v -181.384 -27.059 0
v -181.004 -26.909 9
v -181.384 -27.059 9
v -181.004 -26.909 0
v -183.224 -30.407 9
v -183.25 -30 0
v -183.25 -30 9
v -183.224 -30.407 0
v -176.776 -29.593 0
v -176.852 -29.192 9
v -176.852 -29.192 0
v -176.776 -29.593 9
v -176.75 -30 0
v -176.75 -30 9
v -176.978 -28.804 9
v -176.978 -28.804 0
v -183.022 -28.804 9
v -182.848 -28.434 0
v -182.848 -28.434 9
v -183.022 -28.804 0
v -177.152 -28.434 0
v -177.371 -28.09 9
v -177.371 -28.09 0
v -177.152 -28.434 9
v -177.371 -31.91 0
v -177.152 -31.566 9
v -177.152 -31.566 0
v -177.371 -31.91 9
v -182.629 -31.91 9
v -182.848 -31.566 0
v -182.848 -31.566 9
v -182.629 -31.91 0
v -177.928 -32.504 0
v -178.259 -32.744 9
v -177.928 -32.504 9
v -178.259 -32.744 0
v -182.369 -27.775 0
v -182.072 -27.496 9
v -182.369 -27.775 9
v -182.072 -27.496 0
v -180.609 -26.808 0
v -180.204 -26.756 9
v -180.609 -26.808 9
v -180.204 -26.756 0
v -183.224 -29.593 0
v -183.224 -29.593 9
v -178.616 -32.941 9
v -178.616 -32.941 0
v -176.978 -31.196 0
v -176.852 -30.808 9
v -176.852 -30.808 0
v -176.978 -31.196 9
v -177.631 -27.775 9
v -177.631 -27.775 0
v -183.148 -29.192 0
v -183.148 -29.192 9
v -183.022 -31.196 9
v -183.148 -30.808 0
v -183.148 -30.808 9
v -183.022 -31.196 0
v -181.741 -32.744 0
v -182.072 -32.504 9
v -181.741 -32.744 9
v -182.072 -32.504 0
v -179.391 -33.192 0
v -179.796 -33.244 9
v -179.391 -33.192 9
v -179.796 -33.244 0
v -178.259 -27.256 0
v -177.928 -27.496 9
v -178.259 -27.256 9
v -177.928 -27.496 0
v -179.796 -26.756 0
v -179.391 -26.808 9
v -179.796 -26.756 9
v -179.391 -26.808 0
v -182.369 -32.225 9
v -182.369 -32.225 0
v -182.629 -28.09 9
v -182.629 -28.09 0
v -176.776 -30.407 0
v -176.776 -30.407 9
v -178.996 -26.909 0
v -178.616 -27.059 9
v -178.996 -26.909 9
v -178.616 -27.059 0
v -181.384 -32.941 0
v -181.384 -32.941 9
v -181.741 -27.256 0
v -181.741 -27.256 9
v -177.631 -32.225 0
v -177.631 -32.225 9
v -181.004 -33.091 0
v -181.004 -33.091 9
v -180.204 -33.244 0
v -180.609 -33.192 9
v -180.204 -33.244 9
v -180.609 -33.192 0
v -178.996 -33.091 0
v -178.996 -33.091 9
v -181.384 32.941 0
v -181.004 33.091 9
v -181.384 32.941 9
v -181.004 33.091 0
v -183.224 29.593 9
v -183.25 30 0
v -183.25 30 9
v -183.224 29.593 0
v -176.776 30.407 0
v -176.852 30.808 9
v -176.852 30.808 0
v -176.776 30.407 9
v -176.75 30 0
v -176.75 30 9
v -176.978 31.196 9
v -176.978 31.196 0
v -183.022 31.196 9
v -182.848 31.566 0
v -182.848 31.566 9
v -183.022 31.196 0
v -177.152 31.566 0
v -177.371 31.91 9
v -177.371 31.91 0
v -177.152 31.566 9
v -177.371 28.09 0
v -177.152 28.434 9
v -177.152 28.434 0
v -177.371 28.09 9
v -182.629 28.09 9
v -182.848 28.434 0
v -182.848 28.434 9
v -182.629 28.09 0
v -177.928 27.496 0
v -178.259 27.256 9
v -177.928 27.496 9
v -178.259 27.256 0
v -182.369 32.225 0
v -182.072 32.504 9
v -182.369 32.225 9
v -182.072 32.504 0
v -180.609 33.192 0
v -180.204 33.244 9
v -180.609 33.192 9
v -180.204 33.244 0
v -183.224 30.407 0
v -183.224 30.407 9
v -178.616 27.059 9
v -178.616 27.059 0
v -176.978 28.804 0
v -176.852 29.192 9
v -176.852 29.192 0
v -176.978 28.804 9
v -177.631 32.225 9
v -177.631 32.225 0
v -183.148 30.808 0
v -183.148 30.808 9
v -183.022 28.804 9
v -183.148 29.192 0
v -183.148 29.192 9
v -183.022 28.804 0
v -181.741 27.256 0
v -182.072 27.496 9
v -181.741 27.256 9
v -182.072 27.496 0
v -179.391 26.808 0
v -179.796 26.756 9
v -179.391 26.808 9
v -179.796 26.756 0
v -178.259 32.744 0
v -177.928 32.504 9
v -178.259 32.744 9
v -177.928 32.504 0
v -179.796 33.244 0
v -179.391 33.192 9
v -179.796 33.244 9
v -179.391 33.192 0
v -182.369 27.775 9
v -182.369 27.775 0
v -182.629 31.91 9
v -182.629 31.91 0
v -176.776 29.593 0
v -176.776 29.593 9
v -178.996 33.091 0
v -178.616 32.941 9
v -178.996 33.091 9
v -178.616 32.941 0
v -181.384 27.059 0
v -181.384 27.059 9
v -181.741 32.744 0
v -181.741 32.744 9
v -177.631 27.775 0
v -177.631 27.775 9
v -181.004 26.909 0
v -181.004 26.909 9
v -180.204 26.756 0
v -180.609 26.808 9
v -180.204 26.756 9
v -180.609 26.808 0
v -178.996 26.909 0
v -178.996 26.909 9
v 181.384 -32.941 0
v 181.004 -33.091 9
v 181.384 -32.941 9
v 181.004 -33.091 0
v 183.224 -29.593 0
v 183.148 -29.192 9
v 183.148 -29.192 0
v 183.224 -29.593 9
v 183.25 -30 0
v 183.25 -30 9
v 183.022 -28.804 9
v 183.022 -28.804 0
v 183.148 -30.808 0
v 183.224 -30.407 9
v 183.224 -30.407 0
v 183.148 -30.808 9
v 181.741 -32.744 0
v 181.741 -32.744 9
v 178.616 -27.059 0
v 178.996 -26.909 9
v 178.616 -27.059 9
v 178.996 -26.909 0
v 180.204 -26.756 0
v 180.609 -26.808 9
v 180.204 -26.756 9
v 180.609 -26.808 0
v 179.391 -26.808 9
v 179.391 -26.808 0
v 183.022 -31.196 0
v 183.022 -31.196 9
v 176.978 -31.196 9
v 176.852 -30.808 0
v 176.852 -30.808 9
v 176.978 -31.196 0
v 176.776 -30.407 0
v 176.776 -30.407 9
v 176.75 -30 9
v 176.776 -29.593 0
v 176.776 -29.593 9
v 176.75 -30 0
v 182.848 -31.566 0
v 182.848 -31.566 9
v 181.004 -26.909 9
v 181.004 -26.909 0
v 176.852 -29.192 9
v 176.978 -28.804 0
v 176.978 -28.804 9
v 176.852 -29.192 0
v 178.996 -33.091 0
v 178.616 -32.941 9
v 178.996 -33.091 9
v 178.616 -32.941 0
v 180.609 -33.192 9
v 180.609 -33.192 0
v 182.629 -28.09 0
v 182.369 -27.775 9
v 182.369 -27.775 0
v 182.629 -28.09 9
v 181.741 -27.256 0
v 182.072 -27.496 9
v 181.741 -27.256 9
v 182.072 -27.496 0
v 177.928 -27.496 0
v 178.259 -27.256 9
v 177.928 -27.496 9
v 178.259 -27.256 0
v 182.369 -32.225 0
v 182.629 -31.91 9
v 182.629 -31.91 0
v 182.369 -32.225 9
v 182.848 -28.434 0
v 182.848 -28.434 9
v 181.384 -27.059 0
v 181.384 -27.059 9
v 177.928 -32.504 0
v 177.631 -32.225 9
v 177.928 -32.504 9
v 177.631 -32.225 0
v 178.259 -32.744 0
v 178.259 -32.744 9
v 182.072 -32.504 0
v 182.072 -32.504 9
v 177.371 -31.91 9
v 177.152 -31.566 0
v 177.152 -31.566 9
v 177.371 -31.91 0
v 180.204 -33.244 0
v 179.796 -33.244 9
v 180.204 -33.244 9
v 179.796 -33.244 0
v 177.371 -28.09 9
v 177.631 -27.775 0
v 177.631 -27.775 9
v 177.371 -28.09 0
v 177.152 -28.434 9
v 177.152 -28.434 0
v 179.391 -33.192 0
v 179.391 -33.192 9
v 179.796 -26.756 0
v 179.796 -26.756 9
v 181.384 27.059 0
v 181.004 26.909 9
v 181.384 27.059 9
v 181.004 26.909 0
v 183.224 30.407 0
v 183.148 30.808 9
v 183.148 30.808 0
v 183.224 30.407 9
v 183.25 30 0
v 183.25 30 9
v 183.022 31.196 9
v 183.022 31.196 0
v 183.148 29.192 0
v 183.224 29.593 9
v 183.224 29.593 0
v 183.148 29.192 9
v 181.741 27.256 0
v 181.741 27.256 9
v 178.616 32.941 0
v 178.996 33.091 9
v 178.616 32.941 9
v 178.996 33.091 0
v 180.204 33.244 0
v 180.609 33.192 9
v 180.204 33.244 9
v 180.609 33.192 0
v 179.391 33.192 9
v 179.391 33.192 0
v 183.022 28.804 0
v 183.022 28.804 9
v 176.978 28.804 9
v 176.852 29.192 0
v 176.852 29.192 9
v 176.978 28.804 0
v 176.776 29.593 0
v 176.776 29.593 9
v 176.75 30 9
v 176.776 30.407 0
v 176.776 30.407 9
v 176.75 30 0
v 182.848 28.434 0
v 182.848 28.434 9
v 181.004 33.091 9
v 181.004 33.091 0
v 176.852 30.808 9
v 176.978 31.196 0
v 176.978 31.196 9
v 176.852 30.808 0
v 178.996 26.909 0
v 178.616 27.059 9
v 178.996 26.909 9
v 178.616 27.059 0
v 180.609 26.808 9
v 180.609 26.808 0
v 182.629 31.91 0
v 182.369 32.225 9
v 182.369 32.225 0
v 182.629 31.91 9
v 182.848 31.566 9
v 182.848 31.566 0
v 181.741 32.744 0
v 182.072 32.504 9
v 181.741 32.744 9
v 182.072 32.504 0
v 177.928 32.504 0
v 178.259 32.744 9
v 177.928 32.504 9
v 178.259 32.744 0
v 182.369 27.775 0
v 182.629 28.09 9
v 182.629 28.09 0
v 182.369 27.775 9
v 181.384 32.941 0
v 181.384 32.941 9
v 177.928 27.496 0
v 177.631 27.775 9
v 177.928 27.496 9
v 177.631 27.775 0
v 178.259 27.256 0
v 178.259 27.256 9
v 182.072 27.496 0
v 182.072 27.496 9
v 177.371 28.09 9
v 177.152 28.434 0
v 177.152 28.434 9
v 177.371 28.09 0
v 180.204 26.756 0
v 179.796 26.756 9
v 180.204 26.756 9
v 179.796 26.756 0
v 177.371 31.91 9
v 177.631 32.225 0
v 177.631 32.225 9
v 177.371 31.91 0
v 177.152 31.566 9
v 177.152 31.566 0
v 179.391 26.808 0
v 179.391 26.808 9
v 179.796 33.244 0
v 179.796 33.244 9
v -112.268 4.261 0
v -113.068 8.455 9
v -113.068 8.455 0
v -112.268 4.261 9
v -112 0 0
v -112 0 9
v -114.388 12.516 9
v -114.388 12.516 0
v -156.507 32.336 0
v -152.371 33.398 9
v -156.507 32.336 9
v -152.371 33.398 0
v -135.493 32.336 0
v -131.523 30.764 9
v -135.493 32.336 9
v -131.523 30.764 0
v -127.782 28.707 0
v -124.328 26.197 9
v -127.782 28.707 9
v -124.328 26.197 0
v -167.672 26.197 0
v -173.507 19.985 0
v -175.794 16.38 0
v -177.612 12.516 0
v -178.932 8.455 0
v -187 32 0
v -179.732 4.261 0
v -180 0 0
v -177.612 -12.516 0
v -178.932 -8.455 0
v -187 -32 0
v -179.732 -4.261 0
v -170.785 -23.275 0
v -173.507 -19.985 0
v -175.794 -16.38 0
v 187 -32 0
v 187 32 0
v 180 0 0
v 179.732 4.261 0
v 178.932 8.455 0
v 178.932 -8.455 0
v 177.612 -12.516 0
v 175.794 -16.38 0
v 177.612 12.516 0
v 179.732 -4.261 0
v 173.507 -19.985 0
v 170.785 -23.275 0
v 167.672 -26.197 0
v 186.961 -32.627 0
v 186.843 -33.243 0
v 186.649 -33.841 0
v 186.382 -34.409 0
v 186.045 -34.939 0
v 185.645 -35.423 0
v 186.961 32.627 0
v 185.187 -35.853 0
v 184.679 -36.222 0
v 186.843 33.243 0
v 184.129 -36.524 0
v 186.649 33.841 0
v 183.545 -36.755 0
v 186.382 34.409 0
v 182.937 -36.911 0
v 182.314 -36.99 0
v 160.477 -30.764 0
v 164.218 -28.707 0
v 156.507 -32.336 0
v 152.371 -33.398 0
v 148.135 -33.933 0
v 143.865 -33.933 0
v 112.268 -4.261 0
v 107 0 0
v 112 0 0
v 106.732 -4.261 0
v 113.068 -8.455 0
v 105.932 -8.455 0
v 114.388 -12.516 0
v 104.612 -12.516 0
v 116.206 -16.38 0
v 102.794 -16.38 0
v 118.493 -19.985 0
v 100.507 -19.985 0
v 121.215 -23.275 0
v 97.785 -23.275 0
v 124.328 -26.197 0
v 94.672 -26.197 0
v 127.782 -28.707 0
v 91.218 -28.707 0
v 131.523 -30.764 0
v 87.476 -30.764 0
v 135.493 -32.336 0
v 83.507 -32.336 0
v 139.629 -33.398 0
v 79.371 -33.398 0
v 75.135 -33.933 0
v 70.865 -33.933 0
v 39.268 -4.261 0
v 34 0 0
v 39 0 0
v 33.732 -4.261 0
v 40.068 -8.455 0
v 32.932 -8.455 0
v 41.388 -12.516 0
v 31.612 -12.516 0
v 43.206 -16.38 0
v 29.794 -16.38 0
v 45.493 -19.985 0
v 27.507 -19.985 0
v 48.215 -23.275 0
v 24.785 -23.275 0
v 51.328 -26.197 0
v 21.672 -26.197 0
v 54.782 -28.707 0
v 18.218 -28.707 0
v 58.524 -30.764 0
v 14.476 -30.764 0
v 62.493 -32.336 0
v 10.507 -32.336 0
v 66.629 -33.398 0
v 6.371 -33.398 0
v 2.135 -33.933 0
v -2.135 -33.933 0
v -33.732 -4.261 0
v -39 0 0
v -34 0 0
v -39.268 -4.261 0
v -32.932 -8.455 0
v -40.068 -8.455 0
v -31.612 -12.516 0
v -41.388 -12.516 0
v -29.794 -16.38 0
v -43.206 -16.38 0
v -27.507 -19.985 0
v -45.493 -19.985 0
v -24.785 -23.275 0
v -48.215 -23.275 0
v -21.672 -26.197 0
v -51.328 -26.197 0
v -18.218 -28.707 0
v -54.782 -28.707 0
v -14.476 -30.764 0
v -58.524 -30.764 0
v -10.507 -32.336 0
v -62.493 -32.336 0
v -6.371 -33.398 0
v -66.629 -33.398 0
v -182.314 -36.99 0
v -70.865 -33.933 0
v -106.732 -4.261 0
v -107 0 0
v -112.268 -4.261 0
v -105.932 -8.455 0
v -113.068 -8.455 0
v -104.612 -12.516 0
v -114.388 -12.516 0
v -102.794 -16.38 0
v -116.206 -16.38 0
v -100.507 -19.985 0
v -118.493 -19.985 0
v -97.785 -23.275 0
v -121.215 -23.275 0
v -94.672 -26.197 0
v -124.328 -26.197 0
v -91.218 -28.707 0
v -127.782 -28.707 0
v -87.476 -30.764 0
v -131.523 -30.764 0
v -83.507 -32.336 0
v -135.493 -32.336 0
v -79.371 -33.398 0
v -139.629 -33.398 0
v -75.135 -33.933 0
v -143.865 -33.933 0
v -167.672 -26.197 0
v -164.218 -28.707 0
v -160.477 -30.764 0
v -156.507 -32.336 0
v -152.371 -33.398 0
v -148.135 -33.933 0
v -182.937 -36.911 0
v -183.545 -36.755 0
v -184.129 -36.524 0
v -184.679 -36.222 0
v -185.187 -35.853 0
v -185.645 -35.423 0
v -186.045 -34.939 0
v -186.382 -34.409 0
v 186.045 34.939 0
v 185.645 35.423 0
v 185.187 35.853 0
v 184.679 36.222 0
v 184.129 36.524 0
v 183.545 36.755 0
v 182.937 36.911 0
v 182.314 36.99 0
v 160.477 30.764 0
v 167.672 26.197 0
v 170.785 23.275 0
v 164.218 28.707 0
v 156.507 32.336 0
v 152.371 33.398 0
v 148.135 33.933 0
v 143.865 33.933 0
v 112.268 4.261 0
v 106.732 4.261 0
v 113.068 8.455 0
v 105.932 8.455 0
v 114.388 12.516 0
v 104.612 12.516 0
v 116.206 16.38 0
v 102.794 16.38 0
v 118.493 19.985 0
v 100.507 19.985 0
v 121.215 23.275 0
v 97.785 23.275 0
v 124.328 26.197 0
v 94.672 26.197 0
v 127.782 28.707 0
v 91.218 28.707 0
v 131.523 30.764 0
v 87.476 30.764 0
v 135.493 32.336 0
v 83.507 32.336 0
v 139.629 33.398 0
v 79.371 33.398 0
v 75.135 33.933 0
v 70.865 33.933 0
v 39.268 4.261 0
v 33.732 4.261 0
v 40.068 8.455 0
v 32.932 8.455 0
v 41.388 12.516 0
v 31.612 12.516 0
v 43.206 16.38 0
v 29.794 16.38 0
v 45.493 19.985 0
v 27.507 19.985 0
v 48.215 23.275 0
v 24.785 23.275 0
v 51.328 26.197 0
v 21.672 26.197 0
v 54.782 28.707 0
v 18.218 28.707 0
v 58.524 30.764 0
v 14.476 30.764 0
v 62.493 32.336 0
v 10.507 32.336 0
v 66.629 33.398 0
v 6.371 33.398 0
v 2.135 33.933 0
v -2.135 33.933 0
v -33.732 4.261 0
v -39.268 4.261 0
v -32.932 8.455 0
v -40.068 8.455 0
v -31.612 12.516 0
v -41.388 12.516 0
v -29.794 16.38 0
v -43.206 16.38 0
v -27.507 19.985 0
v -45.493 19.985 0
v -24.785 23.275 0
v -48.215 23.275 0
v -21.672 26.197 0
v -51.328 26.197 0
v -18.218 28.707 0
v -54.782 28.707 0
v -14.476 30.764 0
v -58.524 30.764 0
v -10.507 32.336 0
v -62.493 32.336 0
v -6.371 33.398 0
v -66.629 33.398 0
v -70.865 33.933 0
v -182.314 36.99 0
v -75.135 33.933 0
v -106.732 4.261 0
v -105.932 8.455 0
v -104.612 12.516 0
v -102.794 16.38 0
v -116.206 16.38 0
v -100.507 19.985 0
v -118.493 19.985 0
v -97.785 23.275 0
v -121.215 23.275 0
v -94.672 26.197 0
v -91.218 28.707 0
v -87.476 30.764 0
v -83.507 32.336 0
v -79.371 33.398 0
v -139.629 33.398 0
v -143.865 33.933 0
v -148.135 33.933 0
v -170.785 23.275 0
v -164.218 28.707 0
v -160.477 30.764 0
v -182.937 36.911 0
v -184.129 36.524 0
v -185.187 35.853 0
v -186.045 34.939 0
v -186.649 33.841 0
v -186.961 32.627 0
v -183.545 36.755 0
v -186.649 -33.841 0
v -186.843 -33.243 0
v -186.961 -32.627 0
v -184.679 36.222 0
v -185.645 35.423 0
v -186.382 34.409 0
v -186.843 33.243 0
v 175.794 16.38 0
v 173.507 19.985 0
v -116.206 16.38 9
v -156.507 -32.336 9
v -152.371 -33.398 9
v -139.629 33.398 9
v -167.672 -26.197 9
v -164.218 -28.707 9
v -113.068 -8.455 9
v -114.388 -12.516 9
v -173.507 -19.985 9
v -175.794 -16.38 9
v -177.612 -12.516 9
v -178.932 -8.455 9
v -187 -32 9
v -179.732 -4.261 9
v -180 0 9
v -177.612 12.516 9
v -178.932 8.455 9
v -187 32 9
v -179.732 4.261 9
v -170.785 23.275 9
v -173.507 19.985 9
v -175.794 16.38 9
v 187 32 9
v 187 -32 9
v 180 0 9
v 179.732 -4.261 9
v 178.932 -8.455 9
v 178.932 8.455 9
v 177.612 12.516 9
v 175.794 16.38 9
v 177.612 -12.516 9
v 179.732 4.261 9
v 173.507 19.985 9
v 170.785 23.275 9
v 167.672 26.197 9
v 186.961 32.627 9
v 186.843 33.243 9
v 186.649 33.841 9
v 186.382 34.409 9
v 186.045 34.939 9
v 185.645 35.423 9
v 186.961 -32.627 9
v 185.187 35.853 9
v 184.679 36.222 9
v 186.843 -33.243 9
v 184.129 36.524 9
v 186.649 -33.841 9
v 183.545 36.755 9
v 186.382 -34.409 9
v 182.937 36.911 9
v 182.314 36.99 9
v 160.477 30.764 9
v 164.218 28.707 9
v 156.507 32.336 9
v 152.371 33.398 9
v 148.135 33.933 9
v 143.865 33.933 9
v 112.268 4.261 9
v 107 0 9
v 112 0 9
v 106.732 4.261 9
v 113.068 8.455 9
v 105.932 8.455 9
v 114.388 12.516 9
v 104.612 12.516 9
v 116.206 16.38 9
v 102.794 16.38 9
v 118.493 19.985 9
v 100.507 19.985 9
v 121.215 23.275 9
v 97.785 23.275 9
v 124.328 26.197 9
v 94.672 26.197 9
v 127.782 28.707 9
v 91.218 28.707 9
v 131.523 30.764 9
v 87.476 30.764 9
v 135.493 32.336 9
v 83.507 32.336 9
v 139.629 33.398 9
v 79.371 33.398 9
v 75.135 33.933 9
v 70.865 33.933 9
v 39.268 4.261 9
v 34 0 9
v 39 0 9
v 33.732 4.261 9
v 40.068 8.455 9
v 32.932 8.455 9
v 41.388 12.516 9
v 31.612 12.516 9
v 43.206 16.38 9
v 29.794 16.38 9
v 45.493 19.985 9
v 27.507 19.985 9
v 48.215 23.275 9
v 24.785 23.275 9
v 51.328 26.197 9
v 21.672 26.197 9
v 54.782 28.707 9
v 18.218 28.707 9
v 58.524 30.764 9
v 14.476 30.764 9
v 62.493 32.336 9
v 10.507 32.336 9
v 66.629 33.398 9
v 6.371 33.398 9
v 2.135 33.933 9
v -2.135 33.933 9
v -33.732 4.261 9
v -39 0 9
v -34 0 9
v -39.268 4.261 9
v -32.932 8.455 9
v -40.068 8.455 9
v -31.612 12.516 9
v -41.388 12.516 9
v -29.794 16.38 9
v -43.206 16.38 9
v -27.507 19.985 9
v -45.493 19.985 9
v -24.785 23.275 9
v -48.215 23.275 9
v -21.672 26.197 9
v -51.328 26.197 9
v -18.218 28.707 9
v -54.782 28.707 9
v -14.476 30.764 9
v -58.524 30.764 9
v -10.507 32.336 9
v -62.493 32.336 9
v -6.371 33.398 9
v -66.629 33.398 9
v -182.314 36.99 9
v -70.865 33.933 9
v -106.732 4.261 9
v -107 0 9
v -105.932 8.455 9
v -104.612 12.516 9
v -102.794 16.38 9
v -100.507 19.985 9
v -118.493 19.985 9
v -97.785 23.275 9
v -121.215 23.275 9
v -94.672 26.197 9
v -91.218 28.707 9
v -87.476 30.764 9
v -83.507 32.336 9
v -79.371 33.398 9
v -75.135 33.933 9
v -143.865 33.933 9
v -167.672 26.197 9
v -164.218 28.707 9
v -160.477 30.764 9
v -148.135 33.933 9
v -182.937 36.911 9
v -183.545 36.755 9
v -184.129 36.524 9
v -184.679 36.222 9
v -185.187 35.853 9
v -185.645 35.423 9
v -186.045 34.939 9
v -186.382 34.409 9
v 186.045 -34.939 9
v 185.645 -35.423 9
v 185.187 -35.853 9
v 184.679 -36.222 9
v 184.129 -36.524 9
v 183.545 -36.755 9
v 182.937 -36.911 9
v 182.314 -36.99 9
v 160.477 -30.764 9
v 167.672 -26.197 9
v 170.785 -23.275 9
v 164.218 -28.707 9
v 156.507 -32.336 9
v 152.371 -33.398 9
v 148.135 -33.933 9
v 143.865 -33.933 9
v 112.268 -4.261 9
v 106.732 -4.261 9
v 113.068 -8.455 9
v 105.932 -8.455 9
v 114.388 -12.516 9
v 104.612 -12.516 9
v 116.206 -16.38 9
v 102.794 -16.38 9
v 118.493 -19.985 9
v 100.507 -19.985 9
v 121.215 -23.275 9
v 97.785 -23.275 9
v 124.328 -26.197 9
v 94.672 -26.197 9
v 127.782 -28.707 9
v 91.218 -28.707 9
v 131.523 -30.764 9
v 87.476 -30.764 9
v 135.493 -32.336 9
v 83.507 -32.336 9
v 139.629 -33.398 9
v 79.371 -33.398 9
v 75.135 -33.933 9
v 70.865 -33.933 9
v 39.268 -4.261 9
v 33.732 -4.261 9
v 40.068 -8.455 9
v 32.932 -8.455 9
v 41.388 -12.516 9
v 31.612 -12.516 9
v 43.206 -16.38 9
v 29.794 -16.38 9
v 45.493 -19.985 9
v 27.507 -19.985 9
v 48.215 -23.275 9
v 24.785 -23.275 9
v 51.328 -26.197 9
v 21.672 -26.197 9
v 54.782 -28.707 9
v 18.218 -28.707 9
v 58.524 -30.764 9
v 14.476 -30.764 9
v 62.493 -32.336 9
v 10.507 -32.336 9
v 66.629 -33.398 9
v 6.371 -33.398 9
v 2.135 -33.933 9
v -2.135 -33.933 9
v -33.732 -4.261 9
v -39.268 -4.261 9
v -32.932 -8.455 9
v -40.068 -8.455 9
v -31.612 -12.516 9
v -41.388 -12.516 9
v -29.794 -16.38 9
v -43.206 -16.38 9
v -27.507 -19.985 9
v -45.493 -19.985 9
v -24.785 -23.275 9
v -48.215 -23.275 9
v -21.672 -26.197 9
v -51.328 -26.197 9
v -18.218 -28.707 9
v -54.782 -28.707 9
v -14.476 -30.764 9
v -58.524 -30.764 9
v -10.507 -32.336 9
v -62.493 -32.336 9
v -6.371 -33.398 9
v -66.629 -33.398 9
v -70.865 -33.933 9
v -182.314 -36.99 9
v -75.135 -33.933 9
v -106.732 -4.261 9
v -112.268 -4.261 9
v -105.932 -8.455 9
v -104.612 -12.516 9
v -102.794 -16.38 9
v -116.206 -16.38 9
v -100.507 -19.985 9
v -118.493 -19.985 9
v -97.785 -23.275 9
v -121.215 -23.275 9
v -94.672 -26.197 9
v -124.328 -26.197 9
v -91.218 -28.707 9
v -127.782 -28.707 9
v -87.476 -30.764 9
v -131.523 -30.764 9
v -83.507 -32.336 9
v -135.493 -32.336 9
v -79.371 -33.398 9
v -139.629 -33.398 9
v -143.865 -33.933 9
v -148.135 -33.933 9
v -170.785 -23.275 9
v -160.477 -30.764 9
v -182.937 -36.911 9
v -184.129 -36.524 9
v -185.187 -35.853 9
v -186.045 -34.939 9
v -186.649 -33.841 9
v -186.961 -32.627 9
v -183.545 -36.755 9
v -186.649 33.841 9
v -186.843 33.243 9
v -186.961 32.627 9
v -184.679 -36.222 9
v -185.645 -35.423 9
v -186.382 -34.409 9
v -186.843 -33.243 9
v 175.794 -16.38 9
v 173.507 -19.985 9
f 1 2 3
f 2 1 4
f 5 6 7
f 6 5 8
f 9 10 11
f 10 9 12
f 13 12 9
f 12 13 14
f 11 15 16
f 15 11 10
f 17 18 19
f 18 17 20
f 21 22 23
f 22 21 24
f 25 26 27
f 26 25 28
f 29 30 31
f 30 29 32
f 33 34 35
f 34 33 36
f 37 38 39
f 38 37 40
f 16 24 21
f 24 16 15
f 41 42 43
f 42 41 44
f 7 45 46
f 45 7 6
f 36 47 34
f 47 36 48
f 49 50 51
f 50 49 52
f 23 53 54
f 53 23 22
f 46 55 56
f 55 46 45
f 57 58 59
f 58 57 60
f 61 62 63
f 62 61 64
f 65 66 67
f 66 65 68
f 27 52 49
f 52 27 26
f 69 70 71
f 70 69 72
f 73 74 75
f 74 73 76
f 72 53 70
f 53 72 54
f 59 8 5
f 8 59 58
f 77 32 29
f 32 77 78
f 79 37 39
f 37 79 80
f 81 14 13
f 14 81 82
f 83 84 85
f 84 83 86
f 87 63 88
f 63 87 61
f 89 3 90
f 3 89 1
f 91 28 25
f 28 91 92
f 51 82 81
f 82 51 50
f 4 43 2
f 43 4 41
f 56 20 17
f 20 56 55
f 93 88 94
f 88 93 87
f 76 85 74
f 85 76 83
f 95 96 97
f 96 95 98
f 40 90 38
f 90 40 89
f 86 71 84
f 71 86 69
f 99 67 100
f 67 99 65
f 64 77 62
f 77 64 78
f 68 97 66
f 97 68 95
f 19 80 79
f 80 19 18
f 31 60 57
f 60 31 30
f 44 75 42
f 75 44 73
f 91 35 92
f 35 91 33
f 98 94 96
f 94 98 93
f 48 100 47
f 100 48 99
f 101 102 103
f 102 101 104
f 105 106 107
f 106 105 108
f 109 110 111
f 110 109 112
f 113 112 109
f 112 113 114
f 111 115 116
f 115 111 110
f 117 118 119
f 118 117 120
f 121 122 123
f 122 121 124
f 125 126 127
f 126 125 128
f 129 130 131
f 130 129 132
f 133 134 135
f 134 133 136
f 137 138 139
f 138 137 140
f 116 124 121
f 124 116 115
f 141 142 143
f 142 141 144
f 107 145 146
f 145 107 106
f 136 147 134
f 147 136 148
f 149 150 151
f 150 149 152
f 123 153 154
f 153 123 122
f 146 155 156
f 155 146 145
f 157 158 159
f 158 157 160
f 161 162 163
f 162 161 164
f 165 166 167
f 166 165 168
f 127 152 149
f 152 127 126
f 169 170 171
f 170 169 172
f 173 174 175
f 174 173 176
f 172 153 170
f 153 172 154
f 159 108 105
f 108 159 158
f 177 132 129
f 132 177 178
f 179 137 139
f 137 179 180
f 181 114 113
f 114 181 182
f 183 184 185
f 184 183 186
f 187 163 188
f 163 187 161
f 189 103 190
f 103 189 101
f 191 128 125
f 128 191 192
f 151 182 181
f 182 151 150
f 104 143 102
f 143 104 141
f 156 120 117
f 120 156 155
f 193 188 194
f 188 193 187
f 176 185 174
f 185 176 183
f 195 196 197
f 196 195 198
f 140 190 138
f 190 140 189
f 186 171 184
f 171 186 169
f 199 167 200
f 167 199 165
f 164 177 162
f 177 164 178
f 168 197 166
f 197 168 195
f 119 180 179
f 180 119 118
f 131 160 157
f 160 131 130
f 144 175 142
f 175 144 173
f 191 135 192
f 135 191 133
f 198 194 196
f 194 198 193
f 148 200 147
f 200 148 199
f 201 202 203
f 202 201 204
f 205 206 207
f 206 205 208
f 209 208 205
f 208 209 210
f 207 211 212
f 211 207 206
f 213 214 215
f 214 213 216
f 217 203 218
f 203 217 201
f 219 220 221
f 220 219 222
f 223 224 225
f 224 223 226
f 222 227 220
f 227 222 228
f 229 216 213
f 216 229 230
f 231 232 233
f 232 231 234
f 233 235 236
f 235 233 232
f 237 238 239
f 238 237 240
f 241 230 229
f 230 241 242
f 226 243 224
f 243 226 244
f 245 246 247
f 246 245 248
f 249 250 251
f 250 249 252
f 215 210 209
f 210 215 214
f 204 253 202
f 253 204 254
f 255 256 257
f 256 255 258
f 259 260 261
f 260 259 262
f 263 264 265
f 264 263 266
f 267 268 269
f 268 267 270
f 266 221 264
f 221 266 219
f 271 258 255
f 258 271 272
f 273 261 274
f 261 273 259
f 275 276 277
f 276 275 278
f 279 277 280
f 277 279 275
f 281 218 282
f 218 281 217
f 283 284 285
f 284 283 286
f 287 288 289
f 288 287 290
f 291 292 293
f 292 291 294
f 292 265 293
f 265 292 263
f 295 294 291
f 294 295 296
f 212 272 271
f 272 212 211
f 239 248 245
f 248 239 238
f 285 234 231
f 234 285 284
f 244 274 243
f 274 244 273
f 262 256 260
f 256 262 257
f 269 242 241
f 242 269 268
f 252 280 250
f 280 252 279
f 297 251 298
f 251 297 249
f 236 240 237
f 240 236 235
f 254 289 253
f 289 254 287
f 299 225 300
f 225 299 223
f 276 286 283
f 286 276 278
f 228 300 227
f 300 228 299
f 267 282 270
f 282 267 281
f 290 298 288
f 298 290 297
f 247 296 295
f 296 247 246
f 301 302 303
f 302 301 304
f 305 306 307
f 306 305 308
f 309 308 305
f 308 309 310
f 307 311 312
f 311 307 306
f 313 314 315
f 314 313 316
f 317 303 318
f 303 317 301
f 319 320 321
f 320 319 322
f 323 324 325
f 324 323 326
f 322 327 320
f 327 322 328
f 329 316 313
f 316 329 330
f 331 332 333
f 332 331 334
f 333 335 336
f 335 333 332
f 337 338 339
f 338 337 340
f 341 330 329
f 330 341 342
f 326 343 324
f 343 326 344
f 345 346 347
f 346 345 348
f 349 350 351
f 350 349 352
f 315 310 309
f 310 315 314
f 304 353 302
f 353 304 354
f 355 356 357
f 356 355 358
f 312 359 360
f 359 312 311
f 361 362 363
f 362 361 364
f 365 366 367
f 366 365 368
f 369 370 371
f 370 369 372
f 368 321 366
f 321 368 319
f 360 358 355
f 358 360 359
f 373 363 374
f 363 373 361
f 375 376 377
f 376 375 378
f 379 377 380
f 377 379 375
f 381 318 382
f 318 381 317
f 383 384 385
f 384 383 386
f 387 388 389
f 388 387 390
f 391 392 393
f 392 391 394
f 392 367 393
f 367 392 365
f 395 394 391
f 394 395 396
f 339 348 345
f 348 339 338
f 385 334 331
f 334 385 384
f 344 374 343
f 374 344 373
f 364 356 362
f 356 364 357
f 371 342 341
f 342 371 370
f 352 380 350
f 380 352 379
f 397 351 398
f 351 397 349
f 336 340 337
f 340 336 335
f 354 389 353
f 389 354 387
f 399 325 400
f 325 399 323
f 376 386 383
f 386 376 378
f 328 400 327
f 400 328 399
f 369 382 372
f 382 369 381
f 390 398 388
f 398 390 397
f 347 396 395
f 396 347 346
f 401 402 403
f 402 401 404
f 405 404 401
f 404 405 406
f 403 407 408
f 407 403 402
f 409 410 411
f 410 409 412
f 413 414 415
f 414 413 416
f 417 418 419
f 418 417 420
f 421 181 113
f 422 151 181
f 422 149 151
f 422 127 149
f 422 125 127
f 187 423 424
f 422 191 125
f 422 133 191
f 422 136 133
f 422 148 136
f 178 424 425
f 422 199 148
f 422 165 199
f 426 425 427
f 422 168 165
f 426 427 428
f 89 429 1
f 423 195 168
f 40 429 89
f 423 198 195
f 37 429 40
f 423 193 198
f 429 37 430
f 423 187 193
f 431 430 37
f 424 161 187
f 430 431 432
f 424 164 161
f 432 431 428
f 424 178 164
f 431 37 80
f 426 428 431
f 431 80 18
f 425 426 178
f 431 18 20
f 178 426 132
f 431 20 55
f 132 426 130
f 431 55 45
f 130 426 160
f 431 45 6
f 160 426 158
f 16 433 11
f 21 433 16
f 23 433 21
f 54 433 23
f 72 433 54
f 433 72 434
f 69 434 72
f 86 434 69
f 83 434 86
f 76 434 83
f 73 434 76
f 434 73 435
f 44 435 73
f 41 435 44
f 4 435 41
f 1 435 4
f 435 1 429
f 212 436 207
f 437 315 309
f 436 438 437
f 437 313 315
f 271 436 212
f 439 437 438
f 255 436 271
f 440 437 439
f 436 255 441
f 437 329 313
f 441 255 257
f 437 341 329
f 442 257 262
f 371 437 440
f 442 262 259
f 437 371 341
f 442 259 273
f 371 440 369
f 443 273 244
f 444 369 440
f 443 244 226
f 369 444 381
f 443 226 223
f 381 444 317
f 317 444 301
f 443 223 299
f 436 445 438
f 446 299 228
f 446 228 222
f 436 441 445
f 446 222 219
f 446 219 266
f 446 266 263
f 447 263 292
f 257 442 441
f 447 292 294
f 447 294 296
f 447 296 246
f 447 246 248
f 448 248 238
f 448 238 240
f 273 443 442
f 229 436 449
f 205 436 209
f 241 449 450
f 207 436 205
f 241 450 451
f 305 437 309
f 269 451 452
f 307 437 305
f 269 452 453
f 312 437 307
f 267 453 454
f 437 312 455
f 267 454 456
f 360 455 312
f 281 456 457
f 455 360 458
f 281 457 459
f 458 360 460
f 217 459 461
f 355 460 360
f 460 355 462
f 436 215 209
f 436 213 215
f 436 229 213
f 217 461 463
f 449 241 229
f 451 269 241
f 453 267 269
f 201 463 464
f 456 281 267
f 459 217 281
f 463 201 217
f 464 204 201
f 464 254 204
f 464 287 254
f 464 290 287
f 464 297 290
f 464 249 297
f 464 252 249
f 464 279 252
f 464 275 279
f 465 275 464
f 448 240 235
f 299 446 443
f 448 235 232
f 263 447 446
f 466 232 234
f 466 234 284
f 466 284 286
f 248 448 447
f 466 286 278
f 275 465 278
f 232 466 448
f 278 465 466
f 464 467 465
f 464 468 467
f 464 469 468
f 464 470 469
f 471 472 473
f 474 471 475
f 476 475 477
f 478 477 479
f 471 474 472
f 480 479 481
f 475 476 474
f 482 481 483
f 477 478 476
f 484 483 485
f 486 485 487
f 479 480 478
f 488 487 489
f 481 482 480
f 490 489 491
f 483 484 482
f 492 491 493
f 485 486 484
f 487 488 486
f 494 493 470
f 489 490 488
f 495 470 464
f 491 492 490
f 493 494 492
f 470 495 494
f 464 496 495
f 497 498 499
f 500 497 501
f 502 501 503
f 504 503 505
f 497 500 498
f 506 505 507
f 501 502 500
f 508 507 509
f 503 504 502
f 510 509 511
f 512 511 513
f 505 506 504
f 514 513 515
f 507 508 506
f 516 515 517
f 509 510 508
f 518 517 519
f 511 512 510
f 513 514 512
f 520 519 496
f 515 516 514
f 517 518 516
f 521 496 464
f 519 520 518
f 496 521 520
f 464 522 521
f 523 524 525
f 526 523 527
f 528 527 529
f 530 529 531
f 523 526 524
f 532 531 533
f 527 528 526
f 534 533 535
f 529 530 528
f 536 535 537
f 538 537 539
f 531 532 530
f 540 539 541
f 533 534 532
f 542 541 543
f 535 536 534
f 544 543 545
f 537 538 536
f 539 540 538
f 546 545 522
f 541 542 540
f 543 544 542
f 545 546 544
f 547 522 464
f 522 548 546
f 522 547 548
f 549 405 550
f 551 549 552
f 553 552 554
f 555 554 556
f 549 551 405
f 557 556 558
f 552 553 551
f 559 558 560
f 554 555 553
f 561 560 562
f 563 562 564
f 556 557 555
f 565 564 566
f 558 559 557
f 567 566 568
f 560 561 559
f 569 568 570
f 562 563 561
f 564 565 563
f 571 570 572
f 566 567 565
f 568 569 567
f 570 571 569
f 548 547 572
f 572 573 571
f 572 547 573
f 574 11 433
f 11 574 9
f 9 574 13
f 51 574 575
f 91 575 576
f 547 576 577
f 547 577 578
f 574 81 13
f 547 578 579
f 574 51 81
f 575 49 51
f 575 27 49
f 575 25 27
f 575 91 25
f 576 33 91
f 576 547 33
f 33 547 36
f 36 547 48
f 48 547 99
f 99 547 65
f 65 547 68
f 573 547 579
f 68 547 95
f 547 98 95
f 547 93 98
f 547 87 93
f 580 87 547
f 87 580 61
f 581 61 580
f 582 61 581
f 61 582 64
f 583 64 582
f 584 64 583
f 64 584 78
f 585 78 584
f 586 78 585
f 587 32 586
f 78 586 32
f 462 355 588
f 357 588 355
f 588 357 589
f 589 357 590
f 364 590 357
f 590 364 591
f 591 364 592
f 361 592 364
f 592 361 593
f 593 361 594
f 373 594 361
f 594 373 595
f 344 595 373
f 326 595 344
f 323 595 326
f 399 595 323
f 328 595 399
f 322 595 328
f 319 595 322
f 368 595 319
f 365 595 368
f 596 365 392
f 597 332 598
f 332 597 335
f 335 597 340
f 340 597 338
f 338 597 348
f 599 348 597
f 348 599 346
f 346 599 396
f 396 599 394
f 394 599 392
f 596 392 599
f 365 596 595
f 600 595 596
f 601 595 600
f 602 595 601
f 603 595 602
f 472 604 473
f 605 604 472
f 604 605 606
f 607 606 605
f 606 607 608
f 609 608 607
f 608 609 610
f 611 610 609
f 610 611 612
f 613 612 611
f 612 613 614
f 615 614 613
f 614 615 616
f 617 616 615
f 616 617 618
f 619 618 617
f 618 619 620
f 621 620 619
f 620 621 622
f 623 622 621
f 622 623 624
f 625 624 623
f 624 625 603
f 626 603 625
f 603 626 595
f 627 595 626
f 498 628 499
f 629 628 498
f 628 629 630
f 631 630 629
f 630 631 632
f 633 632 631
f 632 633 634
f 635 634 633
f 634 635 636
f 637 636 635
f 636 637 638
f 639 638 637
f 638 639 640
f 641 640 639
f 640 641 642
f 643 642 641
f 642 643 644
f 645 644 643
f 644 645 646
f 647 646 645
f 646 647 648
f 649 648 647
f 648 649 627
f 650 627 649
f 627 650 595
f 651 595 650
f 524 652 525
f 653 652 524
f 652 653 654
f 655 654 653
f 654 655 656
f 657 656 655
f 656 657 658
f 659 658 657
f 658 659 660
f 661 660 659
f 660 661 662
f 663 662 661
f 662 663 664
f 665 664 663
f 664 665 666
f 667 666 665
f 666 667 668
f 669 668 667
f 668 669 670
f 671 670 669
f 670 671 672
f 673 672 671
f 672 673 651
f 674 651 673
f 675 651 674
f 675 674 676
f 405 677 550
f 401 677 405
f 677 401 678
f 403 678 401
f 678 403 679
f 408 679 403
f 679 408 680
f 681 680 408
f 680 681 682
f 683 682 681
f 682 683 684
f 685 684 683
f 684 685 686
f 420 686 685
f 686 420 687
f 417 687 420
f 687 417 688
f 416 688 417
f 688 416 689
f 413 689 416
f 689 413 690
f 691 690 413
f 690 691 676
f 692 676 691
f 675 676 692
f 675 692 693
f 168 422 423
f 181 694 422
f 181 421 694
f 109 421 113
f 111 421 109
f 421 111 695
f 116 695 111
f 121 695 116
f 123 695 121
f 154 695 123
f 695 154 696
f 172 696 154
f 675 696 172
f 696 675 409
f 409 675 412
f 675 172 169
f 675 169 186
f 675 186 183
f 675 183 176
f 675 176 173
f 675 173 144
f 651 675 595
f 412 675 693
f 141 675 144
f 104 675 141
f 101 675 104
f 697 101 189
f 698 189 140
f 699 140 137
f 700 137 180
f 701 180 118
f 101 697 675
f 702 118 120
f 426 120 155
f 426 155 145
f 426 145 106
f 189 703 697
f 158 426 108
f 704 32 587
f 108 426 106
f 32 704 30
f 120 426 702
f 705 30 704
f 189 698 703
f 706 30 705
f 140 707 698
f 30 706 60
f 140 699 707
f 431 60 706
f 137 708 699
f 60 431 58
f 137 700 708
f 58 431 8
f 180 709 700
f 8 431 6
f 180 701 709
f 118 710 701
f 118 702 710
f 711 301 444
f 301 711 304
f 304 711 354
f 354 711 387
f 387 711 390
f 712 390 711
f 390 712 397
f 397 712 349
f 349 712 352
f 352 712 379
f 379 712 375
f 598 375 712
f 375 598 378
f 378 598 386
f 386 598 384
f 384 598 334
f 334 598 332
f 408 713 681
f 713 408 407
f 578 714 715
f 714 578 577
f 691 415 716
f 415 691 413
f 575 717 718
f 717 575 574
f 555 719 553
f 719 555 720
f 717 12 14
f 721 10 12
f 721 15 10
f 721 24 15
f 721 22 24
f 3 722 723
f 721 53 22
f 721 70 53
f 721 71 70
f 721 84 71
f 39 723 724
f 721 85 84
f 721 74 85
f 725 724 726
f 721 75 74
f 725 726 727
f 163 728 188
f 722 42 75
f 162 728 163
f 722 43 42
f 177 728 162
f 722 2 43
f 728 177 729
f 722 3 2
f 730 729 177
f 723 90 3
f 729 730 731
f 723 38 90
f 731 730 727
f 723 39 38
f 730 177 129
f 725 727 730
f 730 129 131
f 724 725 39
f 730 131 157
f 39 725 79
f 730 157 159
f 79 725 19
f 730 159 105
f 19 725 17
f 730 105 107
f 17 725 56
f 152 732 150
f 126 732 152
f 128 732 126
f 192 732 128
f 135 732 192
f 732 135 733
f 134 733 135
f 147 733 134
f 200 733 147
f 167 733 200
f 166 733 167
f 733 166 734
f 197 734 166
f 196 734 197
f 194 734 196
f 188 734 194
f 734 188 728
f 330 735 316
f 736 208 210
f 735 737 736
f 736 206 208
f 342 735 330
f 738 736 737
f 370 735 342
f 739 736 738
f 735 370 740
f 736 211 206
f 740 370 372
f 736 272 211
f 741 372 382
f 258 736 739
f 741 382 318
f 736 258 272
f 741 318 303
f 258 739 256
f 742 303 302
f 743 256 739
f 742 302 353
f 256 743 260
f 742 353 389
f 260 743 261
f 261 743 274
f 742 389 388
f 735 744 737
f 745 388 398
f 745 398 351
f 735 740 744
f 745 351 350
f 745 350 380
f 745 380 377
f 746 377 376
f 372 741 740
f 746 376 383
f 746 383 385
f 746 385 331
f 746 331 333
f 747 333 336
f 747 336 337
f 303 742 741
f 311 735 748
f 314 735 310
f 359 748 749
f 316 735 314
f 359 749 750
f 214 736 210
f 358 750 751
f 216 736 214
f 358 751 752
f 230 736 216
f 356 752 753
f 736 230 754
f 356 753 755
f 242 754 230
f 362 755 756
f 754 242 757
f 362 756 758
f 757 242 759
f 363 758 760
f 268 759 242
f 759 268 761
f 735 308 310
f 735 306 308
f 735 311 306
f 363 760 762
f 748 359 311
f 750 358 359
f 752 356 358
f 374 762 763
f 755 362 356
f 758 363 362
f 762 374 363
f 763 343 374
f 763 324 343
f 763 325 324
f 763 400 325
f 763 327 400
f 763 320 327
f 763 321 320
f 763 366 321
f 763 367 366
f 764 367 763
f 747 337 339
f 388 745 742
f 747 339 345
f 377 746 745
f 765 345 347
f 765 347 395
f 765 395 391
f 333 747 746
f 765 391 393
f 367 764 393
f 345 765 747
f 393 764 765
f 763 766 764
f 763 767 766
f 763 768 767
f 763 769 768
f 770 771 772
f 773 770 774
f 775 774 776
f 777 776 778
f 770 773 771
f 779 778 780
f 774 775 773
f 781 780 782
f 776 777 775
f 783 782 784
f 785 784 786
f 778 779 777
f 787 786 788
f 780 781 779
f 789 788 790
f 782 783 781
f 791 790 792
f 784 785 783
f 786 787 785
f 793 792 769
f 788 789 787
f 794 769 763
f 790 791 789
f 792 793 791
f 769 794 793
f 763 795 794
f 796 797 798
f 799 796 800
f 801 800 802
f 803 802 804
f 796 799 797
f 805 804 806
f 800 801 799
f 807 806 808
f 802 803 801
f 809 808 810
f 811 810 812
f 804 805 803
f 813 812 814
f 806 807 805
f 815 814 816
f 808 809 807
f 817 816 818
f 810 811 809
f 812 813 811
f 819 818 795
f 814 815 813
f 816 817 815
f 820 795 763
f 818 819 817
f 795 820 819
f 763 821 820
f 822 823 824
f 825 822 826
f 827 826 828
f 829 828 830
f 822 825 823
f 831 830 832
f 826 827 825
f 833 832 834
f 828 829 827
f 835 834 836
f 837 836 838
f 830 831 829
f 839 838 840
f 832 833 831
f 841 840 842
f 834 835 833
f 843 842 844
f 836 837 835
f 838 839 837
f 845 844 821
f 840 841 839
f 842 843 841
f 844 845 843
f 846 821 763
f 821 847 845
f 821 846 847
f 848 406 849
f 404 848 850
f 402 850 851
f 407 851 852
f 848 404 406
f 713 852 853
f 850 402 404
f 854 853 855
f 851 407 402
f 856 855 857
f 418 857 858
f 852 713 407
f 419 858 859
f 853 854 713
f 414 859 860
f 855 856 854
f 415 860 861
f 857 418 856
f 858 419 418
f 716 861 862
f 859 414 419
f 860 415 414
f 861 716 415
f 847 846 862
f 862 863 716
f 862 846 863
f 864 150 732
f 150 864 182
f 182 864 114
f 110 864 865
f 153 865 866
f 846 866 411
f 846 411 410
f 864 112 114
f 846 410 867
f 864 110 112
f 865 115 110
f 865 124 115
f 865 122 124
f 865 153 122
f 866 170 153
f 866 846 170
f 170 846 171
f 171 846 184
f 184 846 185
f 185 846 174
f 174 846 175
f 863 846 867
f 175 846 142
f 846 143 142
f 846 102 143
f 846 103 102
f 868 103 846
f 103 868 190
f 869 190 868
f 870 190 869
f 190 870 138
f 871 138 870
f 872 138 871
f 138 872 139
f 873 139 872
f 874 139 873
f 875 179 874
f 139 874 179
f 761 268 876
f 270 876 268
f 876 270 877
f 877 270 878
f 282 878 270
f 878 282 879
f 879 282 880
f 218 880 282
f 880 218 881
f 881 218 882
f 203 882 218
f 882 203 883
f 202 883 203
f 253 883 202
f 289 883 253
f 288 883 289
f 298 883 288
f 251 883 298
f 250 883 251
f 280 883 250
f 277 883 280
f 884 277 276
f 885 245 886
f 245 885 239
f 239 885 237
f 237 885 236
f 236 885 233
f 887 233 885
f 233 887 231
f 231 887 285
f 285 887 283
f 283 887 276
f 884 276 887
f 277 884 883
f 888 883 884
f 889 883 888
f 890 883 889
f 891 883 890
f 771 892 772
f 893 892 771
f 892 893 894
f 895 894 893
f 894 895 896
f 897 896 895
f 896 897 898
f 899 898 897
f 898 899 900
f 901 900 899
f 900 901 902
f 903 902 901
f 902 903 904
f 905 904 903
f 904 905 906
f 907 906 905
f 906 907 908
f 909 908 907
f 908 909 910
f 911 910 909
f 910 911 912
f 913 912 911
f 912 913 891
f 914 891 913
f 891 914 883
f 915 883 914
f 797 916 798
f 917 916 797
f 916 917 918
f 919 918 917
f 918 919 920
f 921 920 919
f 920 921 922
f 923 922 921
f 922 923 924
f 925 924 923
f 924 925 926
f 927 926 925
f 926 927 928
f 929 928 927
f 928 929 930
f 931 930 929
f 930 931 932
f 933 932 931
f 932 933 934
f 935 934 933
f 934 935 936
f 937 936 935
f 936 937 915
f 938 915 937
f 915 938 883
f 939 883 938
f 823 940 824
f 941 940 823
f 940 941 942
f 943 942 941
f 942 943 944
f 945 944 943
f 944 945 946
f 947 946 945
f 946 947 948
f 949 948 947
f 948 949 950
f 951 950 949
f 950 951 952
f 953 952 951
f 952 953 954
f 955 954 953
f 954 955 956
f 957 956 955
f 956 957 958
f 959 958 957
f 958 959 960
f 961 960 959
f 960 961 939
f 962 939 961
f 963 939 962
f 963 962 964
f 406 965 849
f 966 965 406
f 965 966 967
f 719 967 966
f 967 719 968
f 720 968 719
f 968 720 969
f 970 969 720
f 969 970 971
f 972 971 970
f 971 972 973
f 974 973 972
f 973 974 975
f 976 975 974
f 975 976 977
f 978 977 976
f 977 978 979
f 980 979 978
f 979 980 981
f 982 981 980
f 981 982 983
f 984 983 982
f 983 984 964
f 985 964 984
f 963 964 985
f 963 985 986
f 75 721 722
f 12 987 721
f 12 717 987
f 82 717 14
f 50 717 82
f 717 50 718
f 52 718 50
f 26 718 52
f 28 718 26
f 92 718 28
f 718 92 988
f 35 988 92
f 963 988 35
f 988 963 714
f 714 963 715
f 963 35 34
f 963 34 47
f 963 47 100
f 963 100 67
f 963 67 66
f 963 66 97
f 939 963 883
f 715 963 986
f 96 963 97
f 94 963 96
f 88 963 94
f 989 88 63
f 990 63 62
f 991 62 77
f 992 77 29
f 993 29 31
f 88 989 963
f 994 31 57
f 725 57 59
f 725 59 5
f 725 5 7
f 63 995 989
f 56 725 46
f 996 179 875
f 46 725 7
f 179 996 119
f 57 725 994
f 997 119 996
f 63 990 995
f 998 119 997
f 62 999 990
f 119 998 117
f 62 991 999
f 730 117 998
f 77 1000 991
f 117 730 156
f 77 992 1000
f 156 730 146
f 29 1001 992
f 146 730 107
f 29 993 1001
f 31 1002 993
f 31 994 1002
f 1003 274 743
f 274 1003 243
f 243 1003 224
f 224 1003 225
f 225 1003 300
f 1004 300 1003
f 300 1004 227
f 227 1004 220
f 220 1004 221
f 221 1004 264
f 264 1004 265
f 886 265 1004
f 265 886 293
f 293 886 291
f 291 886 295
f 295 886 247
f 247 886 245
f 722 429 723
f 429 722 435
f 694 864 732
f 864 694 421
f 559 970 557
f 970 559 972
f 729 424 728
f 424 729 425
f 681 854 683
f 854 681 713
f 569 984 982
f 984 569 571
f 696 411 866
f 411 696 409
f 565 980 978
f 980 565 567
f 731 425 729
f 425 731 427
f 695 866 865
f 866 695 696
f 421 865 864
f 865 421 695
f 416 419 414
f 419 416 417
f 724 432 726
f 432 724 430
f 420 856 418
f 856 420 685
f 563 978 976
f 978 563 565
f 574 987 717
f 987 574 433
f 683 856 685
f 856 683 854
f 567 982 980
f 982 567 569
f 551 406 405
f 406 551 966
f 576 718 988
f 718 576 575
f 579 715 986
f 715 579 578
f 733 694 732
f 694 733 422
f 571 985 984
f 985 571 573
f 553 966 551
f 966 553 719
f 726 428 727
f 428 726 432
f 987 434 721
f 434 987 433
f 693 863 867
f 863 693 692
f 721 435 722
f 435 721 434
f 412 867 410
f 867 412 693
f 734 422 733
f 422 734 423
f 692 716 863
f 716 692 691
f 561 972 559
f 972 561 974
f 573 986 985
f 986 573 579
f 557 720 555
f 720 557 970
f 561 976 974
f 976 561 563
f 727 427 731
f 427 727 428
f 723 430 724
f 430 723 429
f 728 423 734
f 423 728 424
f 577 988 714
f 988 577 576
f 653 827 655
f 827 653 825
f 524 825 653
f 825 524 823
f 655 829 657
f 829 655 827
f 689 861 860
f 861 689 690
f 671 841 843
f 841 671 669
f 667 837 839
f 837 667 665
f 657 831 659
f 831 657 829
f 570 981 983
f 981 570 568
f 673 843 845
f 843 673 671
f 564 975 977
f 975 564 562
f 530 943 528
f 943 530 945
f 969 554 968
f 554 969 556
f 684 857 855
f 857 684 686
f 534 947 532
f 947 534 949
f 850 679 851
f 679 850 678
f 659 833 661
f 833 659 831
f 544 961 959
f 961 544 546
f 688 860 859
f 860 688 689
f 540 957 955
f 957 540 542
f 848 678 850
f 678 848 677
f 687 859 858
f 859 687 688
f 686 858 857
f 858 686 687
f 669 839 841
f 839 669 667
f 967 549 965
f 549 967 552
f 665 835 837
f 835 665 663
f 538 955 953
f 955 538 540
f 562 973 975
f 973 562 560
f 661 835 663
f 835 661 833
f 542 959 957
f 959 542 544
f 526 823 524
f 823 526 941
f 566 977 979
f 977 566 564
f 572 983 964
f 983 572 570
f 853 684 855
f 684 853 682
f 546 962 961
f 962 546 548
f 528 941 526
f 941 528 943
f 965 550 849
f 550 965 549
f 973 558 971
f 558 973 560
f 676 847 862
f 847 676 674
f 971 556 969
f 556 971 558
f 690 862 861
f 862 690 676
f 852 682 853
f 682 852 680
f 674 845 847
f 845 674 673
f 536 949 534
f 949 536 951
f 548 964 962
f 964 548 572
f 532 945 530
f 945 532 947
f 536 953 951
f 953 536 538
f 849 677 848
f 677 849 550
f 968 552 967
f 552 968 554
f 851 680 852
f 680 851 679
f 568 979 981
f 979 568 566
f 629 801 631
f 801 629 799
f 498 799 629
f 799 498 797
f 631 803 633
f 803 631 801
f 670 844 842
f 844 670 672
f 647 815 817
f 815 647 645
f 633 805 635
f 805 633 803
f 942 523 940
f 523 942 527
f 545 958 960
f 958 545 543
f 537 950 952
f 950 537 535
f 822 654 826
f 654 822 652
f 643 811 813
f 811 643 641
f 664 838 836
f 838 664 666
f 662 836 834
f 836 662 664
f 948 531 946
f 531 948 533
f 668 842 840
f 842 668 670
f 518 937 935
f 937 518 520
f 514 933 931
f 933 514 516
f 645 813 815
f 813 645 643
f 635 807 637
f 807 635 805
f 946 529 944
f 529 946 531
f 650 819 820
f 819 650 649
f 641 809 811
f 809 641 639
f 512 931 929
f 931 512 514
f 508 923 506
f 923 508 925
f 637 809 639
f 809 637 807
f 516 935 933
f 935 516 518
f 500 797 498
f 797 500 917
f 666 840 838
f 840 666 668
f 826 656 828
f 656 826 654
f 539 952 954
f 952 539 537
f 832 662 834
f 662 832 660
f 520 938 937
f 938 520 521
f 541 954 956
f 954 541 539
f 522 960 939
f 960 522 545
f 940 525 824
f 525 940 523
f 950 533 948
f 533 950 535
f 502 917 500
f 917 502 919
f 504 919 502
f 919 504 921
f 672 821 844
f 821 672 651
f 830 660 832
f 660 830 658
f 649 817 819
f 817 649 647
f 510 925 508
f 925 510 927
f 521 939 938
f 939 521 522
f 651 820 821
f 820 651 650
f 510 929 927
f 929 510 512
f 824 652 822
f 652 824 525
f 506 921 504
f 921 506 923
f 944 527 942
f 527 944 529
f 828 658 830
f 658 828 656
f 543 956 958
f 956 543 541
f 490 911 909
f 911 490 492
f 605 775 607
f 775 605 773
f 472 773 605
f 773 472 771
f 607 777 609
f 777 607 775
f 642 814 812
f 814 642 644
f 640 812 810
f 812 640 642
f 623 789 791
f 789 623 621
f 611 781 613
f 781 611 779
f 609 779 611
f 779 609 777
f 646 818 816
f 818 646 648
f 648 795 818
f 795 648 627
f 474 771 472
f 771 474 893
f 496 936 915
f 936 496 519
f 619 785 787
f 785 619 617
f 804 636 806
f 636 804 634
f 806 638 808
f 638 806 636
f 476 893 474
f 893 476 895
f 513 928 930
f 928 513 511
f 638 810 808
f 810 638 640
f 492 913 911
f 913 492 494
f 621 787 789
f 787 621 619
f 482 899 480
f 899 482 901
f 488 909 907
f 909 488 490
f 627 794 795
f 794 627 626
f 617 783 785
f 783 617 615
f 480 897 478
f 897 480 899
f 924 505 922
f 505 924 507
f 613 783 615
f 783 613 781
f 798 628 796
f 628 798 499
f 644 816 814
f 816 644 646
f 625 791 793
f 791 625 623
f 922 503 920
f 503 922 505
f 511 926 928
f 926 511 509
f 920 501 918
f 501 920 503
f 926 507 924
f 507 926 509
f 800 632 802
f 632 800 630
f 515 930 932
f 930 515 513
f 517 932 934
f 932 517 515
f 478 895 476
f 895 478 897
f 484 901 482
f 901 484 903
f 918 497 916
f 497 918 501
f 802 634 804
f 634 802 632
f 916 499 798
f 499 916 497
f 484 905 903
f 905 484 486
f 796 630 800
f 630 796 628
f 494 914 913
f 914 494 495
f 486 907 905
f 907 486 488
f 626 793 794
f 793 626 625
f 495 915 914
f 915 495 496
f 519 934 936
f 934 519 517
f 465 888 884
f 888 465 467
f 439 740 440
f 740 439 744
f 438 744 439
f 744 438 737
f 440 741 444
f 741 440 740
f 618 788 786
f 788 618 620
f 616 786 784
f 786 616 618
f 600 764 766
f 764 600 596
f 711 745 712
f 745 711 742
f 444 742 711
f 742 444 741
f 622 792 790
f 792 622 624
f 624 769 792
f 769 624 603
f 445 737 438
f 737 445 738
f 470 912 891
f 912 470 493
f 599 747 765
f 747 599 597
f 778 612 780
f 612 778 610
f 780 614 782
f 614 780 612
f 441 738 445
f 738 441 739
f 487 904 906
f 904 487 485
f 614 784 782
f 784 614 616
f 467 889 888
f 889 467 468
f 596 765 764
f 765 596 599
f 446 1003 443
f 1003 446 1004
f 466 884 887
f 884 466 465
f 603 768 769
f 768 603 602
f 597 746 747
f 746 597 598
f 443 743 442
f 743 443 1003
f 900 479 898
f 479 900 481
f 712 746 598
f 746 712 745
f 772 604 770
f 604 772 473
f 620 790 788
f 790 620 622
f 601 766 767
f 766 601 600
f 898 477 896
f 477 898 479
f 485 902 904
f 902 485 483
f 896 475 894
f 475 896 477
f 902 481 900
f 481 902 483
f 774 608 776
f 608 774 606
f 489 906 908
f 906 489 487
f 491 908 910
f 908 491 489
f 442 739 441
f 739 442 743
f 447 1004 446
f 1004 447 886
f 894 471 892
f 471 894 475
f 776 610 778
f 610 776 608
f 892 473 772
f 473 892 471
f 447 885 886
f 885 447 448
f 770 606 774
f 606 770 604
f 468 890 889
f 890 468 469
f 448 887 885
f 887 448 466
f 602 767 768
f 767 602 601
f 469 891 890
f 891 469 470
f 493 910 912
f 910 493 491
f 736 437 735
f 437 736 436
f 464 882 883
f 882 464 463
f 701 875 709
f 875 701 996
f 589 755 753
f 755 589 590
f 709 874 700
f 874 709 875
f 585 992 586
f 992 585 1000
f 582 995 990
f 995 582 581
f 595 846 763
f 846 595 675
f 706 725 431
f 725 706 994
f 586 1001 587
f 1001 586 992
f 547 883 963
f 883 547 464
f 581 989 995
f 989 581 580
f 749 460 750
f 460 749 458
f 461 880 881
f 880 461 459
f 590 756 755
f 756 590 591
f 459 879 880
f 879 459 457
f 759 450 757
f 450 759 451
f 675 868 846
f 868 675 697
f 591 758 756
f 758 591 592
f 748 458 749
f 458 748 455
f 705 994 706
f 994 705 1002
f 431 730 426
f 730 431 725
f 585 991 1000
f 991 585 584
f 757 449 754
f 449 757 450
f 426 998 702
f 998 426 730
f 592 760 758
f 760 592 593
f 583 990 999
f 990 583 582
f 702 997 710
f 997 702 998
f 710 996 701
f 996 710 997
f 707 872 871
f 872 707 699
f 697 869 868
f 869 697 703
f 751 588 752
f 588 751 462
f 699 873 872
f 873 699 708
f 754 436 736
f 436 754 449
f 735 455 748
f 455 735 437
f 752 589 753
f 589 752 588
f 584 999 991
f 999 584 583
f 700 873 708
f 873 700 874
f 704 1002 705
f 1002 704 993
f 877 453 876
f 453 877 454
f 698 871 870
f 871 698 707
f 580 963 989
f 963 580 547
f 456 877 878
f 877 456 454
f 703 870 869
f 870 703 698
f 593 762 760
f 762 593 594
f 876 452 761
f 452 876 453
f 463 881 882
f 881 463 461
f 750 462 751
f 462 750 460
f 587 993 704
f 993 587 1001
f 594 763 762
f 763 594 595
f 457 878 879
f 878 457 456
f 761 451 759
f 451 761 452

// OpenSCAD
$fn = 50;

difference() {
	union() {
		hull() {
			translate(v = [-182.0, 32.0, 0]) {
				cylinder(h = 9, r = 5);
			}
			translate(v = [182.0, 32.0, 0]) {
				cylinder(h = 9, r = 5);
			}
			translate(v = [-182.0, -32.0, 0]) {
				cylinder(h = 9, r = 5);
			}
			translate(v = [182.0, -32.0, 0]) {
				cylinder(h = 9, r = 5);
			}
		}
	}
	union() {
		translate(v = [-180.0, -30.0, -100.0]) {
			cylinder(h = 200, r = 3.25);
		}
		translate(v = [-180.0, 30.0, -100.0]) {
			cylinder(h = 200, r = 3.25);
		}
		translate(v = [180.0, -30.0, -100.0]) {
			cylinder(h = 200, r = 3.25);
		}
		translate(v = [180.0, 30.0, -100.0]) {
			cylinder(h = 200, r = 3.25);
		}
		translate(v = [-180.0, -30.0, -100.0]) {
			cylinder(h = 200, r = 1.8);
		}
		translate(v = [-180.0, 30.0, -100.0]) {
			cylinder(h = 200, r = 1.8);
		}
		translate(v = [180.0, -30.0, -100.0]) {
			cylinder(h = 200, r = 1.8);
		}
		translate(v = [180.0, 30.0, -100.0]) {
			cylinder(h = 200, r = 1.8);
		}
		translate(v = [-146.0, 0, 0.0]) {
			cylinder(h = 9, r = 34.0);
		}
		translate(v = [-73.0, 0, 0.0]) {
			cylinder(h = 9, r = 34.0);
		}
		cylinder(h = 9, r = 34.0);
		translate(v = [73.0, 0, 0.0]) {
			cylinder(h = 9, r = 34.0);
		}
		translate(v = [146.0, 0, 0.0]) {
			cylinder(h = 9, r = 34.0);
		}
	}
}
